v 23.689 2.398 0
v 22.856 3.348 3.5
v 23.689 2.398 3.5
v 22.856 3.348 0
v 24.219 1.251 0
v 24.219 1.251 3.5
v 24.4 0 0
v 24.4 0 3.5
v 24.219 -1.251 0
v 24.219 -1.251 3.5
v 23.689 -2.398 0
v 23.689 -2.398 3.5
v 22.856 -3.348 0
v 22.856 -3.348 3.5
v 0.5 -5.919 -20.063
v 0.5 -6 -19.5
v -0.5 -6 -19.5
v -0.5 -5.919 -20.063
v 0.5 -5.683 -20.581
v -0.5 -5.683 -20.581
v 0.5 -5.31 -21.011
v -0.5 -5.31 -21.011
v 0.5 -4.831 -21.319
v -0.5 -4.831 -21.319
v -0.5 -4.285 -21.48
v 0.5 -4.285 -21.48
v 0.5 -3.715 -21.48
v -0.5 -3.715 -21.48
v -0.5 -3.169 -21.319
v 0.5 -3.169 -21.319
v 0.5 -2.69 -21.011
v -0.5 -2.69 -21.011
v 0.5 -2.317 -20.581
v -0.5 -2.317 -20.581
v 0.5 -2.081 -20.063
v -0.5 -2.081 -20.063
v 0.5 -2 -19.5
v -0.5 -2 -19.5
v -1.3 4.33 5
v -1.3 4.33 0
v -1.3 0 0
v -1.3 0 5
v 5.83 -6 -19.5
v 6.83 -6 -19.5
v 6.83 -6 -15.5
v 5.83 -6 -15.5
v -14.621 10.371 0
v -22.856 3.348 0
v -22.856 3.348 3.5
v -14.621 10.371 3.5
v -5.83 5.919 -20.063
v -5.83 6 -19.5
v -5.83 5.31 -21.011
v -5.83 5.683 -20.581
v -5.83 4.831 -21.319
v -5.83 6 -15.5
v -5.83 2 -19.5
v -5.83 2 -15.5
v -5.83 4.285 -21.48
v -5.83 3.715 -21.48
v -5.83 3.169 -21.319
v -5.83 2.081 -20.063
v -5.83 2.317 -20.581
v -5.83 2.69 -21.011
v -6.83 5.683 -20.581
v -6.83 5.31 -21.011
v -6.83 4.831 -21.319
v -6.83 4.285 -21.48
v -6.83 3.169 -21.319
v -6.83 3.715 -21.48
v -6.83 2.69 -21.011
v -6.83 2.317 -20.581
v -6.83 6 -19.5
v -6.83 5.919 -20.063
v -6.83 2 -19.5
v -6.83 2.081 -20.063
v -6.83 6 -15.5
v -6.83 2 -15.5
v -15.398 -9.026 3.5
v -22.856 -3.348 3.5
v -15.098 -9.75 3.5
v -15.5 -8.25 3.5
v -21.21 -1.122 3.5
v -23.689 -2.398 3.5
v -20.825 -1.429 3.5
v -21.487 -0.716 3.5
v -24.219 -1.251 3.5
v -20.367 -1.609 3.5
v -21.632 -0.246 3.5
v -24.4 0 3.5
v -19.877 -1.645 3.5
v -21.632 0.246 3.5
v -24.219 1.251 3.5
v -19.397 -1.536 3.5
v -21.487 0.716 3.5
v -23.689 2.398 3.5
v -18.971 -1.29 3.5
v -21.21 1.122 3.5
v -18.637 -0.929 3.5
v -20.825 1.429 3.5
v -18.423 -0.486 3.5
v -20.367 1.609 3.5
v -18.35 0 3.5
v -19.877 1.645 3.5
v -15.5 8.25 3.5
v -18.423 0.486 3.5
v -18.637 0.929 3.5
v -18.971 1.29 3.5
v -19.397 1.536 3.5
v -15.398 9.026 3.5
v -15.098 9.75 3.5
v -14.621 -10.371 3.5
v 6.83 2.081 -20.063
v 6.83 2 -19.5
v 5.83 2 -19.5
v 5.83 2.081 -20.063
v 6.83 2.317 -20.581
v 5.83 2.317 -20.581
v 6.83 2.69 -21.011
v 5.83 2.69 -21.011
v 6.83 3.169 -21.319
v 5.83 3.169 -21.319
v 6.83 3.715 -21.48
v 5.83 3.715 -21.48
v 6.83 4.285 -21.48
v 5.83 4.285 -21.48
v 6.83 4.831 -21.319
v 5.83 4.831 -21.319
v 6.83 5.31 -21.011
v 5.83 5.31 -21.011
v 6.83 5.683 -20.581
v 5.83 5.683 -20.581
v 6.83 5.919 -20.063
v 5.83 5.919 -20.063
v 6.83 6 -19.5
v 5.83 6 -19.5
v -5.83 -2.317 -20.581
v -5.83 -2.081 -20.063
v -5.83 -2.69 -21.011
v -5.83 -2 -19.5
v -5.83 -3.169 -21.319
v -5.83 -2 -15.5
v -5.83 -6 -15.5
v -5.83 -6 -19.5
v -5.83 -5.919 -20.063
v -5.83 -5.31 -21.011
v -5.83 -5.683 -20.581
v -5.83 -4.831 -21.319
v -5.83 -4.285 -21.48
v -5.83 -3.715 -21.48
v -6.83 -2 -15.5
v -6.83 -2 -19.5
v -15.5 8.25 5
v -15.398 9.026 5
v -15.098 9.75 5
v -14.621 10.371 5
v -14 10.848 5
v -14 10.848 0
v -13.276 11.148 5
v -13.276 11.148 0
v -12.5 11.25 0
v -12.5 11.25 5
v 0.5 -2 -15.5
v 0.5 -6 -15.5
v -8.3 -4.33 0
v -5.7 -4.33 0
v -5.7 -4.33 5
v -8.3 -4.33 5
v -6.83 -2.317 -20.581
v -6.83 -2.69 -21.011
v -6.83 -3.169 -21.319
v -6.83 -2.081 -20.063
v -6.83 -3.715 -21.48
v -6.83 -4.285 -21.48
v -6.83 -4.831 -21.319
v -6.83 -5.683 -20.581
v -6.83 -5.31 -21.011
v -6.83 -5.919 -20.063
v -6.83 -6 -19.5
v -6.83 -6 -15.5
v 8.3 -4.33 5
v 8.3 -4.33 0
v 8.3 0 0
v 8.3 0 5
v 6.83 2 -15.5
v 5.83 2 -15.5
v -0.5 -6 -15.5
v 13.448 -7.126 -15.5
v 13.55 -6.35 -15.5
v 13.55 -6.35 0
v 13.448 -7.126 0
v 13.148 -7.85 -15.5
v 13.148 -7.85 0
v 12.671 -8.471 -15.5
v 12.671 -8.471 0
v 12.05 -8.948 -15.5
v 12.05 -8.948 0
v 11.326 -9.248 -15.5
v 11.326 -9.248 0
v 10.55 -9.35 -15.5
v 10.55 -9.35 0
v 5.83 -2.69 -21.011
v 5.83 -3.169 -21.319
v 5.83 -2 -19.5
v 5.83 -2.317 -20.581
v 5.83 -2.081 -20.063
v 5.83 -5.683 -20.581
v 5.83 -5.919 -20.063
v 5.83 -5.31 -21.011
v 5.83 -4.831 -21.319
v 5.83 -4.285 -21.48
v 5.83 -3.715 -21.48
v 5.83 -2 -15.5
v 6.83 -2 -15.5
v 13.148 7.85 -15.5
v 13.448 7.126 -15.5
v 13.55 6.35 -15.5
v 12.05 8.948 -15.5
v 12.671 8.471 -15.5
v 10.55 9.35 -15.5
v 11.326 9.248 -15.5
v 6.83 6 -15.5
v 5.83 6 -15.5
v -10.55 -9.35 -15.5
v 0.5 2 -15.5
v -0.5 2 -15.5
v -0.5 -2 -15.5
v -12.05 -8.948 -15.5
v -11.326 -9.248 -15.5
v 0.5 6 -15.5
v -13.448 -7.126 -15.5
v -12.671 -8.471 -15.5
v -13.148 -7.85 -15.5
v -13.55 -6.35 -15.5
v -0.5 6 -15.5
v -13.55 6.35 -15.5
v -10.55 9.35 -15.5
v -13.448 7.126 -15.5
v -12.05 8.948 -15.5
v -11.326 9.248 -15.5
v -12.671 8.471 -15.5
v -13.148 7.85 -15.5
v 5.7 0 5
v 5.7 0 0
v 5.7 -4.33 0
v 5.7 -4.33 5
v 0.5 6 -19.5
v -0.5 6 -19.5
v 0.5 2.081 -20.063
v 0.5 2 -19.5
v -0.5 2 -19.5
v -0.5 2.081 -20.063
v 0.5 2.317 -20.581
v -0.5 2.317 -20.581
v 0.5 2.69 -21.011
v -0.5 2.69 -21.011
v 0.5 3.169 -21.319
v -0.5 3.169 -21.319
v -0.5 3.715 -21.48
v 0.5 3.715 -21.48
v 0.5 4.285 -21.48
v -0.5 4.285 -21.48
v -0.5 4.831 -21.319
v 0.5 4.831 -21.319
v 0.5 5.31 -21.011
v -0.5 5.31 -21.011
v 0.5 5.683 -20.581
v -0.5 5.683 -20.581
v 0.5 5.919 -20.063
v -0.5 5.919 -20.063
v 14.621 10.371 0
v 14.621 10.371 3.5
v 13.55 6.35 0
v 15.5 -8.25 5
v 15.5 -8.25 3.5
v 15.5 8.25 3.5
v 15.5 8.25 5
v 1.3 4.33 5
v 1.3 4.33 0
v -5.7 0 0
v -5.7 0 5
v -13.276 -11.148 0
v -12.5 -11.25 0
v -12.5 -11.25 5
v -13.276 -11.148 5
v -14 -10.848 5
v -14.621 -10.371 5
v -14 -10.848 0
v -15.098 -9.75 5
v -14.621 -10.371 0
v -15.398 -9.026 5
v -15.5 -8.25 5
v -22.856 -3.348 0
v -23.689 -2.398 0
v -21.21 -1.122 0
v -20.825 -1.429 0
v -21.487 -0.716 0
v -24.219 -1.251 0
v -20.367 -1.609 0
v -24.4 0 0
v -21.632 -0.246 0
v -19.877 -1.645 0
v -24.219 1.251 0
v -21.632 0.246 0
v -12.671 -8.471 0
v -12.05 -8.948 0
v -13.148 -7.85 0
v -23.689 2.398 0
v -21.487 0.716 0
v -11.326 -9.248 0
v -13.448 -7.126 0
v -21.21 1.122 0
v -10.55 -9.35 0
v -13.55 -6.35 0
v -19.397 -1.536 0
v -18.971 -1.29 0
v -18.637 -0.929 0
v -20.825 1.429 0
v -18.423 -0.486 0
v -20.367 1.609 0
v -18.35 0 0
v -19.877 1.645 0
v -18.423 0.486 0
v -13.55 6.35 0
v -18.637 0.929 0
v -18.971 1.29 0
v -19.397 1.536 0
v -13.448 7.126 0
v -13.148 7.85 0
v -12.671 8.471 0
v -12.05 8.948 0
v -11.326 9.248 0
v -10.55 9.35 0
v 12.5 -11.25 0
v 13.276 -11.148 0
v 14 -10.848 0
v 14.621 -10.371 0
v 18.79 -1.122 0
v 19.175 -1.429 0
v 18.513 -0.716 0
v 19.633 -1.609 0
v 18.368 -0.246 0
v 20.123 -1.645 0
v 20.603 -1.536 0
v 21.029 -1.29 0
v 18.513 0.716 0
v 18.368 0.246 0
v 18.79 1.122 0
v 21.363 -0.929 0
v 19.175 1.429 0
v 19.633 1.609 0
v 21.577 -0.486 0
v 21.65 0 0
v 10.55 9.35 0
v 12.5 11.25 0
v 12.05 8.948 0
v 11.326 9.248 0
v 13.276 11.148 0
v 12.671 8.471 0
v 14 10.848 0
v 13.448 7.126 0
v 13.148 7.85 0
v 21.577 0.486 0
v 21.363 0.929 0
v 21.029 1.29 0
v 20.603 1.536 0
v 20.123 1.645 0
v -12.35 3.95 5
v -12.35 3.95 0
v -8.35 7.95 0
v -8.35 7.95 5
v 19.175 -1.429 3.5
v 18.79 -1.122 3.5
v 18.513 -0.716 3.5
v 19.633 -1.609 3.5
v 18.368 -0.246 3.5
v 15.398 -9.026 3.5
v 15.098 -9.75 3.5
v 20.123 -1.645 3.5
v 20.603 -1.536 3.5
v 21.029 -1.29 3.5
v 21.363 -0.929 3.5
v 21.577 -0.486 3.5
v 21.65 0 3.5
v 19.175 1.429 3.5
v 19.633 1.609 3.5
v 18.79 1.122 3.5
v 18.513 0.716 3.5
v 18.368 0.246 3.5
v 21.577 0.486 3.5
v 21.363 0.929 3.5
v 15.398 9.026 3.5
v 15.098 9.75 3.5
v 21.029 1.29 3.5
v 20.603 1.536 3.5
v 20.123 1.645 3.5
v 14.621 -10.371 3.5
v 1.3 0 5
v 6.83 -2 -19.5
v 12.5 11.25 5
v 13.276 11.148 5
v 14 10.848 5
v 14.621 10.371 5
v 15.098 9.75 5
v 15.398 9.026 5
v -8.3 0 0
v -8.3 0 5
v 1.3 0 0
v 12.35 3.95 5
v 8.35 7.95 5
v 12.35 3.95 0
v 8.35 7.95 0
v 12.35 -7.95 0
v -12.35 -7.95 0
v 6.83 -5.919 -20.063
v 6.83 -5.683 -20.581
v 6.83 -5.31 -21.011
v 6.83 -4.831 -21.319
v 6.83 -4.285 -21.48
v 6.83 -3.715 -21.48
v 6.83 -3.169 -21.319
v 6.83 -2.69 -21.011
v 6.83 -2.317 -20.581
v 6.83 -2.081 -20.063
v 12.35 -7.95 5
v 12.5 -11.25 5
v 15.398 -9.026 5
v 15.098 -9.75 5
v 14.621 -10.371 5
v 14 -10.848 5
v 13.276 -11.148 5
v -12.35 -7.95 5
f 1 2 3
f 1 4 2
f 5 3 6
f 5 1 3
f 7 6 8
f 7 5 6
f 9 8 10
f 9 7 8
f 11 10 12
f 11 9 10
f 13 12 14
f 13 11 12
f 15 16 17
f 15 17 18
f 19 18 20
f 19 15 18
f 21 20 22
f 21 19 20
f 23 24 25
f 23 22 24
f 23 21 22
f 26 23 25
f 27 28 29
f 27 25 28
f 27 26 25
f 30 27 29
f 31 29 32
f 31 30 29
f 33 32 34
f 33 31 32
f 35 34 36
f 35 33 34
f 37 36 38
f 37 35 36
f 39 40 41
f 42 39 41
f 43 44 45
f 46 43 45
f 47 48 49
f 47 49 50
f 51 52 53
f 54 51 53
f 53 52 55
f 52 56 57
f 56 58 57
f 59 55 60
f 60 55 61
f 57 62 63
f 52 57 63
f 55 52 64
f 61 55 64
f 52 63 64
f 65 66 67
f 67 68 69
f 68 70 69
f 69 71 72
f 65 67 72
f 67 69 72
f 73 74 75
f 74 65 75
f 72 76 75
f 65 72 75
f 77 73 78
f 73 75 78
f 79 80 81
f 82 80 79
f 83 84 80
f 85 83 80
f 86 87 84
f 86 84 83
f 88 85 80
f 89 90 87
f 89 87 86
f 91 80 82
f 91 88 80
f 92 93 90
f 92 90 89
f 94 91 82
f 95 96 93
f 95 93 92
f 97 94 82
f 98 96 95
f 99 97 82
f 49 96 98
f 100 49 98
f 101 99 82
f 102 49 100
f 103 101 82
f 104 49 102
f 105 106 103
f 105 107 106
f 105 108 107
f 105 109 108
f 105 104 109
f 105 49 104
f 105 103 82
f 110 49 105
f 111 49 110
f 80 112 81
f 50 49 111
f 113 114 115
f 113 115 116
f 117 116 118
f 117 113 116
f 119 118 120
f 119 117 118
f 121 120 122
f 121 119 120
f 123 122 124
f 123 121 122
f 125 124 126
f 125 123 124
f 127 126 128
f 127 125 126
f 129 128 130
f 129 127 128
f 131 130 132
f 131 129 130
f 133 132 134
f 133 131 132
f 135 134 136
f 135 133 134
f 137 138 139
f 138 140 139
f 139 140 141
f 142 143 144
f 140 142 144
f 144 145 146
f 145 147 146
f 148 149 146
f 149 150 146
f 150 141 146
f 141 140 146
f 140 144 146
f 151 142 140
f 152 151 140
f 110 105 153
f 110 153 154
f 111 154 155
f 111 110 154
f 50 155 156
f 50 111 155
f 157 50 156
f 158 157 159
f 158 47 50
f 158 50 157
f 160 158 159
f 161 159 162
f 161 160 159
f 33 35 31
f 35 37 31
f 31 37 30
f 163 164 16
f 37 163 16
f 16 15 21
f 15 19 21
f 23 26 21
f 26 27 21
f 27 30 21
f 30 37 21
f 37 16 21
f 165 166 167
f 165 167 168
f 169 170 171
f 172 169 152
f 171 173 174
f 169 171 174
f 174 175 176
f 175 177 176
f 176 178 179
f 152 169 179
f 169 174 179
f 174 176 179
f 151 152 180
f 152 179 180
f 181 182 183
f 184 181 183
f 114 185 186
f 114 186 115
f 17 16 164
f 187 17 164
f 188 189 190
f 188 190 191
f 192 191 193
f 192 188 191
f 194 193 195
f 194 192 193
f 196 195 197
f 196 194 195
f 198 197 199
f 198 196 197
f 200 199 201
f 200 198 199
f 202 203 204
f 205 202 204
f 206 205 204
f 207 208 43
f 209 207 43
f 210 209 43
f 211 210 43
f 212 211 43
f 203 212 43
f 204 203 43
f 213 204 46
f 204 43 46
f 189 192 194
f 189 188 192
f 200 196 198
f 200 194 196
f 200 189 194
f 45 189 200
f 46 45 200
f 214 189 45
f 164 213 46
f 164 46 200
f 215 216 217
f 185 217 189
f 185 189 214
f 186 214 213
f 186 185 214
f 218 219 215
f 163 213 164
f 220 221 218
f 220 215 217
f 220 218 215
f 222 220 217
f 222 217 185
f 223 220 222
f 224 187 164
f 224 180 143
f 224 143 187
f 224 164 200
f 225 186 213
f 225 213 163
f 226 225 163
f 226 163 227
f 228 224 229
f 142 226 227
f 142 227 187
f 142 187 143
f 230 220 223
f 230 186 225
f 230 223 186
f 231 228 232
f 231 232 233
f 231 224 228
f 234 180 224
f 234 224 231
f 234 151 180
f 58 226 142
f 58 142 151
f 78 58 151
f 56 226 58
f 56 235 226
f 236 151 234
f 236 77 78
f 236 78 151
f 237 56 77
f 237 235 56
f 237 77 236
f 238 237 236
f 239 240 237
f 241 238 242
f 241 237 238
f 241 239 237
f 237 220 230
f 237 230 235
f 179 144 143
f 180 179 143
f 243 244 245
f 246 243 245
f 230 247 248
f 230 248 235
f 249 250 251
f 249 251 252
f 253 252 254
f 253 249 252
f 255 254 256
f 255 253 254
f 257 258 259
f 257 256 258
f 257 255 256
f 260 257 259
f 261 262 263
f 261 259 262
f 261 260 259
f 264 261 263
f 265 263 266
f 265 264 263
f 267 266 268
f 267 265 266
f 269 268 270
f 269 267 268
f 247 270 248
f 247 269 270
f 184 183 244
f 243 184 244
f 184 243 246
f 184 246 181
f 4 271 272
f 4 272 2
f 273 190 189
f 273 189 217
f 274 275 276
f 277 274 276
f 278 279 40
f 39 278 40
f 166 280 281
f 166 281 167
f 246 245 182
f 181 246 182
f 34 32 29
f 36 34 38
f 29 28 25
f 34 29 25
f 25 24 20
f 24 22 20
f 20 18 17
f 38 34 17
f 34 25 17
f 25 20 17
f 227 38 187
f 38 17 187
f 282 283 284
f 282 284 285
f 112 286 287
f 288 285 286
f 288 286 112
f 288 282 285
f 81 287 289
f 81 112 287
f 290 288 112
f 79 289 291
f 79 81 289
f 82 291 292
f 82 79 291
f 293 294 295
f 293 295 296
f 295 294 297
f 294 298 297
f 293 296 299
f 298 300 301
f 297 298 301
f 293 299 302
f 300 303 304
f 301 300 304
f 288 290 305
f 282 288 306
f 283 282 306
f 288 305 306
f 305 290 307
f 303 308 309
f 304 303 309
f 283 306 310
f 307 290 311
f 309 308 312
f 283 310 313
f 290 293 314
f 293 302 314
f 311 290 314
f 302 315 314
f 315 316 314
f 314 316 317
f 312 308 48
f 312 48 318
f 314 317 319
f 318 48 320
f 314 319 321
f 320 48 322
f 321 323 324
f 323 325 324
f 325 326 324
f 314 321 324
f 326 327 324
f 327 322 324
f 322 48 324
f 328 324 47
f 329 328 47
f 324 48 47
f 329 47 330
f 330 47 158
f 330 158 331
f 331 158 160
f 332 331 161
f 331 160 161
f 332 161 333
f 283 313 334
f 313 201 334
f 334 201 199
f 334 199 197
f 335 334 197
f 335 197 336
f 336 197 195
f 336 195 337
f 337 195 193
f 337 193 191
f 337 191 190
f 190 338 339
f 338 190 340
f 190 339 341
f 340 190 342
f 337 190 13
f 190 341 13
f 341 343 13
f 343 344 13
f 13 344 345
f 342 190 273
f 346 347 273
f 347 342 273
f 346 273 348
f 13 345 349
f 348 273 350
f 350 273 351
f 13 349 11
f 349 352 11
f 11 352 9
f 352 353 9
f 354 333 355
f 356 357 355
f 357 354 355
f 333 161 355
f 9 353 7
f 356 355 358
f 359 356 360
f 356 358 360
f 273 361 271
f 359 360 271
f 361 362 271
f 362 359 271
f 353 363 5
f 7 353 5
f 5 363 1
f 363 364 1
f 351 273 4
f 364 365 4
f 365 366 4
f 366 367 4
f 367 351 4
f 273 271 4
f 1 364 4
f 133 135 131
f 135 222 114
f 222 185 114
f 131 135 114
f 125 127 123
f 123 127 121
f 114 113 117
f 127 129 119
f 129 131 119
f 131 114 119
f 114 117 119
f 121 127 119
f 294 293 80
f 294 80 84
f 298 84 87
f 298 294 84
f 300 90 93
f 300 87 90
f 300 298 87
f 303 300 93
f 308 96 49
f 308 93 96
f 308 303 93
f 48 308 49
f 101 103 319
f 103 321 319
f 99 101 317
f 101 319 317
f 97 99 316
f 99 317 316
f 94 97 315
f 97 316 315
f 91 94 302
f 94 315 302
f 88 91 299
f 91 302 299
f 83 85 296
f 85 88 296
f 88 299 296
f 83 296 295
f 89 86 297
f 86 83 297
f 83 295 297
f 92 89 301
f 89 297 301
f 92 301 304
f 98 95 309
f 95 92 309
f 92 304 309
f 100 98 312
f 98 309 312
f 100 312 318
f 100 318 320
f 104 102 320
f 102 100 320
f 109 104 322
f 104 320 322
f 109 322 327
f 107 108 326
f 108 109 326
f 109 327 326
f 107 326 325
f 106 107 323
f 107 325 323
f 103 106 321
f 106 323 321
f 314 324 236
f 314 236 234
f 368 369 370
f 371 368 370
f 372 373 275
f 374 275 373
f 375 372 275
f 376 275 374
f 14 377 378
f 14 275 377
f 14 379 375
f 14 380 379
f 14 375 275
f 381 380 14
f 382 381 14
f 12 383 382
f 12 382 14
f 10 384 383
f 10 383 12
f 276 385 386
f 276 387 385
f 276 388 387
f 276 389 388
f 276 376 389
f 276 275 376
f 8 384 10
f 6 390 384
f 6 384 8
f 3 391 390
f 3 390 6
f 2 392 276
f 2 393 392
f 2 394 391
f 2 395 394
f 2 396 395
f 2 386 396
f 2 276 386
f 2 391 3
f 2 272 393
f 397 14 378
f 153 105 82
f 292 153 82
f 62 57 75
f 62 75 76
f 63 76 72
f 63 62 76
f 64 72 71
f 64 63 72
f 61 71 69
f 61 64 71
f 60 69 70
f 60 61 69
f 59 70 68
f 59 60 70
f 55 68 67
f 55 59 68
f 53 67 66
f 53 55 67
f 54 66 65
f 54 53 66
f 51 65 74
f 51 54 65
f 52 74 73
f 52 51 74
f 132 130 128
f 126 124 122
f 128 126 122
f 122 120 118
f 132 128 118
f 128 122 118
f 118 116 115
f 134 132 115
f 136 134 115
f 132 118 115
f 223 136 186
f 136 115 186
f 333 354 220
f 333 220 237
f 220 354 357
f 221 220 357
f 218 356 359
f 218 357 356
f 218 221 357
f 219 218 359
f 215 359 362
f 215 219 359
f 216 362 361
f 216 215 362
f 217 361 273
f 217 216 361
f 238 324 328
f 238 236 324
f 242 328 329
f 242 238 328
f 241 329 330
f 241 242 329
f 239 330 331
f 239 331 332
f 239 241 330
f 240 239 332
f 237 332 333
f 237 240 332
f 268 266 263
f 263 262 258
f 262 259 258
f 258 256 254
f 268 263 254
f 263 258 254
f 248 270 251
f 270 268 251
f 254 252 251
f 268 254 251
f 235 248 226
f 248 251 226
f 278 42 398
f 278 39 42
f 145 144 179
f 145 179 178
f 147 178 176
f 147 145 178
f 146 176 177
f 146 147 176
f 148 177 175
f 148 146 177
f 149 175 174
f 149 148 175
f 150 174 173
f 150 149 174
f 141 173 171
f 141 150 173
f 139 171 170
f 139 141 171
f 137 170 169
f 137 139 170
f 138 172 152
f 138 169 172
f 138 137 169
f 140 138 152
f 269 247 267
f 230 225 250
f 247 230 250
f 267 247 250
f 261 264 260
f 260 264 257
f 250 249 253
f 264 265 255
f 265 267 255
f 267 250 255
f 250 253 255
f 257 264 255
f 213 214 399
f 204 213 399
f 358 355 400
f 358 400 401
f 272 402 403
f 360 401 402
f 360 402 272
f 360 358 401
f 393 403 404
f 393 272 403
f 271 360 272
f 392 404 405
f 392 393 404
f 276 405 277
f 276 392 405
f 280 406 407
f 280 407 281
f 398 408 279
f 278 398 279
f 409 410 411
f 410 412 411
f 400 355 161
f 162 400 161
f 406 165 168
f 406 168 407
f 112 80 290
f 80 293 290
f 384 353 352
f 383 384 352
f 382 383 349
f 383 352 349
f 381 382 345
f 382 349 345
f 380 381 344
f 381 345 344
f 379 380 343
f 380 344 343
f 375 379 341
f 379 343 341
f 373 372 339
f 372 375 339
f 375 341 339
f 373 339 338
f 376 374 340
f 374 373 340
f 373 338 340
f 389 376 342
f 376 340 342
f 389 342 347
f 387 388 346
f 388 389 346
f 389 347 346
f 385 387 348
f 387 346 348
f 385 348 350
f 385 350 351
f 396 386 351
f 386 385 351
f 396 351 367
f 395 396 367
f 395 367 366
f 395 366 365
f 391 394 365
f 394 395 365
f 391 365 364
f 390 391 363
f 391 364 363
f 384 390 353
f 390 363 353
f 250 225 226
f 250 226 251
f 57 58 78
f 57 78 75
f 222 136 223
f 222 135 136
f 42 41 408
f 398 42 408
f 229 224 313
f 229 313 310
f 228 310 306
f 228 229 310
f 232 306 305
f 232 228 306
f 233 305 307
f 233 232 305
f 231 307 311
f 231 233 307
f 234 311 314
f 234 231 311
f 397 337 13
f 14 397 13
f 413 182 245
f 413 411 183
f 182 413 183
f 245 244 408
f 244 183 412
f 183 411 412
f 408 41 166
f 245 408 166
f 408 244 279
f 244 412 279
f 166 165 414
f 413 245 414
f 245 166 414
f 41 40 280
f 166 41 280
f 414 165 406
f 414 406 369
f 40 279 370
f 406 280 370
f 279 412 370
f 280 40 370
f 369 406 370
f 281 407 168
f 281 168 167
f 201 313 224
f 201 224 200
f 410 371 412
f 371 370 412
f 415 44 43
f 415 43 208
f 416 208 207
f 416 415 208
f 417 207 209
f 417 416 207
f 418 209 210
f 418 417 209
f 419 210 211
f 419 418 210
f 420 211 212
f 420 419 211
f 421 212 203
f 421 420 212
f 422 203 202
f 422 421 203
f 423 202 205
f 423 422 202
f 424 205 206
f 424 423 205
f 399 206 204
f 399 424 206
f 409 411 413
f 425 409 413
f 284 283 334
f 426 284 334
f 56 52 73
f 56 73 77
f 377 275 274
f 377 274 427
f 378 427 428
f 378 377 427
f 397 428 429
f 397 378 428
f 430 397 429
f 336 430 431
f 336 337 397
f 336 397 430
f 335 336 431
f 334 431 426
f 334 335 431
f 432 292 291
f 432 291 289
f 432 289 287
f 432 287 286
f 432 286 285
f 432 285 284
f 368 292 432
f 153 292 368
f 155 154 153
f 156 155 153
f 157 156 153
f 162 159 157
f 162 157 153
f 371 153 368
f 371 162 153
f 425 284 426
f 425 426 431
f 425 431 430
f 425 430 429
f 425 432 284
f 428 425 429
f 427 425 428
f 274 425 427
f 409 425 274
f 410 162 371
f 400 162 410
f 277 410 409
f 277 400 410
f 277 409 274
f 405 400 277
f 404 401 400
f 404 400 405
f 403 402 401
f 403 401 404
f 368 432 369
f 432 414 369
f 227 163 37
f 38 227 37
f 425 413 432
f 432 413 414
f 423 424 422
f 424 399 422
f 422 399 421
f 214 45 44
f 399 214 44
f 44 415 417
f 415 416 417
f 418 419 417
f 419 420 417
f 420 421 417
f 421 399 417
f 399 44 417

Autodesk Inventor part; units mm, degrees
ref_plane "YZ Plane" through (0, 0, 0) normal (1, 0, 0) x (0, 1, 0)
ref_plane "XZ Plane" through (0, 0, 0) normal (0, 1, 0) x (-1, 0, 0)
ref_plane "XY Plane" through (0, 0, 0) normal (0, 0, 1) x (1, 0, 0)
sketch "Base" plane through (0, 0, 0) normal (0, 0, 1) x (1, 0, 0)
  line L0 (-12.5, -11.25) -> (12.5, -11.25)
  line L1 (15.5, -8.25) -> (15.5, 8.25)
  line L2 (12.5, 11.25) -> (-12.5, 11.25)
  line L3 (-15.5, 8.25) -> (-15.5, -8.25)
  line L4 (-15.5, -11.25) -> (15.5, 11.25) construction
  line L5 (15.5, -11.25) -> (-15.5, 11.25) construction
  line L6 (-34.16, 0) -> (34.16, 0) construction
  line L7 (0, -16.6198) -> (0, 16.6198) construction
  circle A0 centre (-20, 0) radius 1.65
  circle A1 centre (20, 0) radius 1.65
  circle A2 centre (-20, 0) radius 4.4
  circle A3 centre (20, 0) radius 4.4
  line L8 (-24.4, 0) -> (24.4, 0) construction
  arc A4 (-12.5, 11.25) -> (-15.5, 8.25) centre (-12.5, 8.25) ccw
  arc A5 (-15.5, -8.25) -> (-12.5, -11.25) centre (-12.5, -8.25) ccw
  arc A6 (15.5, 8.25) -> (12.5, 11.25) centre (12.5, 8.25) ccw
  arc A7 (12.5, -11.25) -> (15.5, -8.25) centre (12.5, -8.25) ccw
  line L9 (-22.8555, 3.3476) -> (-14.6213, 10.3713)
  line L10 (14.6213, 10.3713) -> (22.8555, 3.3476)
  line L11 (-22.8555, -3.3476) -> (-14.6213, -10.3713)
  line L12 (14.6213, -10.3713) -> (22.8555, -3.3476)
  point P0 (0, 0)
  dimension "d0" = 31
  dimension "d1" = 22.5
  dimension "d2" = 3.3
  dimension "d3" = 48.8
  dimension "d4" = 40
  dimension "d15" = 3
  dimension "d16" = 3
extrude "BaseFeature" add sketch "Base" along normal blind 3.5
sketch "ReceptacleInside" plane through (0, 0, 3.5) normal (0, 0, 1) x (1, 0, 0)
  line L0 (-12.35, 7.95) -> (12.35, 7.95)
  line L1 (12.35, 7.95) -> (12.35, -7.95)
  line L2 (12.35, -7.95) -> (-12.35, -7.95)
  line L3 (-12.35, -7.95) -> (-12.35, 7.95)
  line L4 (-12.35, 7.95) -> (12.35, -7.95) construction
  line L5 (12.35, 7.95) -> (-12.35, -7.95) construction
  line L6 (-12.35, 3.95) -> (-8.35, 7.95)
  line L7 (12.35, 3.95) -> (8.35, 7.95)
  line L8 (-34.16, 0) -> (34.16, 0) construction
  line L9 (0, -15.75) -> (0, 15.75) construction
  point P0 (0, 0)
  point P1 (8.35, 7.95)
  dimension "d10" = 15.9
  dimension "d11" = 4
  dimension "d12" = 4
extrude "ReceptacleInsideFeature" cut sketch "ReceptacleInside" against normal through all contours L0 L7 L1 L2 L3 L6
sketch "Receptacle" plane through (0, 0, 3.5) normal (0, 0, 1) x (1, 0, 0)
  arc A0 (-12.5, 11.25) -> (-15.5, 8.25) centre (-12.5, 8.25) ccw projected
  line L0 (-15.5, 8.25) -> (-15.5, -8.25) projected
  arc A1 (-15.5, -8.25) -> (-12.5, -11.25) centre (-12.5, -8.25) ccw projected
  line L1 (-12.5, -11.25) -> (12.5, -11.25) projected
  arc A2 (12.5, -11.25) -> (15.5, -8.25) centre (12.5, -8.25) ccw projected
  line L2 (15.5, -8.25) -> (15.5, 8.25) projected
  arc A3 (15.5, 8.25) -> (12.5, 11.25) centre (12.5, 8.25) ccw projected
  line L3 (12.5, 11.25) -> (-12.5, 11.25) projected
  line L4 (-12.35, 3.95) -> (-8.35, 7.95) projected
  line L5 (-8.35, 7.95) -> (8.35, 7.95) projected
  line L6 (8.35, 7.95) -> (12.35, 3.95) projected
  line L7 (12.35, 3.95) -> (12.35, -7.95) projected
  line L8 (12.35, -7.95) -> (-12.35, -7.95) projected
  line L9 (-12.35, -7.95) -> (-12.35, 3.95) projected
  point P0 (0, 0)
extrude "Extrusion4" add sketch "Receptacle" along normal blind 1.5
sketch "Sketch5" plane through (0, 0, 0) normal (0, 0, -1) x (-1, 0, 0)
  line L0 (13.55, -9.35) -> (-13.55, -9.35)
  line L1 (-13.55, -9.35) -> (-13.55, 9.35)
  line L2 (-13.55, 9.35) -> (13.55, 9.35)
  line L3 (13.55, 9.35) -> (13.55, -9.35)
  line L4 (13.55, -9.35) -> (-13.55, 9.35) construction
  line L5 (-13.55, -9.35) -> (13.55, 9.35) construction
  point P0 (0, 0)
  dimension "d19" = 27.1
  dimension "d20" = 18.7
extrude "Extrusion5" add sketch "Sketch5" along normal blind 15.5
fillet "Fillet1" radius 3 4 edges at (-13.55, -9.35, -7.75) (13.55, -9.35, -7.75) (-13.55, 9.35, -7.75) (13.55, 9.35, -7.75)
sketch "Sketch6" plane through (0, 0, 0) normal (0, 0, 1) x (1, 0, 0)
  line L0 (-34.16, 0) -> (34.16, 0) construction
  line L1 (-1.3, 0) -> (1.3, 0)
  line L2 (1.3, 0) -> (1.3, 4.33)
  line L3 (1.3, 4.33) -> (-1.3, 4.33)
  line L4 (-1.3, 4.33) -> (-1.3, 0)
  line L5 (0, -15.75) -> (0, 15.75) construction
  line L6 (-8.3, 0) -> (-5.7, 0)
  line L7 (-5.7, 0) -> (-5.7, -4.33)
  line L8 (-5.7, -4.33) -> (-8.3, -4.33)
  line L9 (-8.3, -4.33) -> (-8.3, 0)
  line L10 (8.3, 0) -> (5.7, 0)
  line L11 (5.7, 0) -> (5.7, -4.33)
  line L12 (5.7, -4.33) -> (8.3, -4.33)
  line L13 (8.3, -4.33) -> (8.3, 0)
  point P0 (0, 0)
  point P1 (7, -4.33)
  point P2 (-7, -4.33)
  dimension "d24" = 14
  dimension "d25" = 2.6
  dimension "d26" = 4.33
extrude "Extrusion6" add sketch "Sketch6" along normal up to surface (5 mm away)
sketch "Sketch7" plane through (-10.55, -9.35, 0) normal (0, -1, 0) x (1, 0, 0)
  line L0 (0, -15.5) -> (21.1, -15.5) projected
  line L1 (3.72, -15.5) -> (4.72, -15.5)
  line L2 (4.72, -15.5) -> (4.72, -21.5)
  line L3 (4.72, -21.5) -> (3.72, -21.5)
  line L4 (3.72, -21.5) -> (3.72, -15.5)
  line L5 (10.05, -15.5) -> (11.05, -15.5)
  line L6 (11.05, -15.5) -> (11.05, -21.5)
  line L7 (11.05, -21.5) -> (10.05, -21.5)
  line L8 (10.05, -21.5) -> (10.05, -15.5)
  line L9 (16.38, -15.5) -> (17.38, -15.5)
  line L10 (17.38, -15.5) -> (17.38, -21.5)
  line L11 (17.38, -21.5) -> (16.38, -21.5)
  line L12 (16.38, -21.5) -> (16.38, -15.5)
  line L13 (10.55, -21.5) -> (10.55, 5) construction
  line L14 (11.85, 5) -> (9.25, 5) projected
  line L15 (10.55, -26.8) -> (10.55, 10.3) construction
  point P0 (10.55, 0)
  point P1 (4.72, -15.5)
  dimension "d29" = 6
  dimension "d30" = 5.33
  dimension "d31" = 5.33
  dimension "d32" = 1
extrude "Extrusion7" add sketch "Sketch7" against normal up to surface (18.7 mm away)
sketch "Sketch8" plane through (6.83, -9.35, -15.5) normal (1, 0, 0) x (0, 0, -1)
  circle A0 centre (4, 5.35) radius 2
  line L0 (6, 0) -> (6, 18.7) projected
  line L1 (0, 0) -> (0, 18.7) projected
  line L2 (4, 3.35) -> (0, 3.35)
  line L3 (0, 3.35) -> (0, 7.35)
  line L4 (0, 7.35) -> (4, 7.35)
  line L5 (4, 7.35) -> (4, 3.35)
  line L6 (11.3, 9.35) -> (-25.8, 9.35) construction
  circle A1 centre (4, 13.35) radius 2
  line L7 (4, 15.35) -> (0, 15.35)
  line L8 (0, 11.35) -> (4, 11.35)
  line L9 (6, 18.7) -> (0, 18.7) projected
  line L10 (0, 0) -> (0, 18.7) projected
  line L11 (6, 0) -> (0, 0) projected
  line L12 (6, 0) -> (6, 18.7) projected
  point P0 (-15.5, 9.35)
  point P1 (6, 5.35)
  point P2 (0, 3.35)
  point P3 (6, 13.35)
  point P4 (0, 15.35)
  dimension "d35" = 4
  dimension "d36" = 4
  dimension "d37" = 4
  dimension "d38" = 2
extrude "Extrusion8" cut sketch "Sketch8" against normal through all contours L0 L11 L1 L2 A0 | A0 L4 L1 L8 A1 L0 | A1 L7 L1 L9 L0
equation "\"d27\" = d25"
equation "\"d33\" = d30"
properties part number "Qteatak"
